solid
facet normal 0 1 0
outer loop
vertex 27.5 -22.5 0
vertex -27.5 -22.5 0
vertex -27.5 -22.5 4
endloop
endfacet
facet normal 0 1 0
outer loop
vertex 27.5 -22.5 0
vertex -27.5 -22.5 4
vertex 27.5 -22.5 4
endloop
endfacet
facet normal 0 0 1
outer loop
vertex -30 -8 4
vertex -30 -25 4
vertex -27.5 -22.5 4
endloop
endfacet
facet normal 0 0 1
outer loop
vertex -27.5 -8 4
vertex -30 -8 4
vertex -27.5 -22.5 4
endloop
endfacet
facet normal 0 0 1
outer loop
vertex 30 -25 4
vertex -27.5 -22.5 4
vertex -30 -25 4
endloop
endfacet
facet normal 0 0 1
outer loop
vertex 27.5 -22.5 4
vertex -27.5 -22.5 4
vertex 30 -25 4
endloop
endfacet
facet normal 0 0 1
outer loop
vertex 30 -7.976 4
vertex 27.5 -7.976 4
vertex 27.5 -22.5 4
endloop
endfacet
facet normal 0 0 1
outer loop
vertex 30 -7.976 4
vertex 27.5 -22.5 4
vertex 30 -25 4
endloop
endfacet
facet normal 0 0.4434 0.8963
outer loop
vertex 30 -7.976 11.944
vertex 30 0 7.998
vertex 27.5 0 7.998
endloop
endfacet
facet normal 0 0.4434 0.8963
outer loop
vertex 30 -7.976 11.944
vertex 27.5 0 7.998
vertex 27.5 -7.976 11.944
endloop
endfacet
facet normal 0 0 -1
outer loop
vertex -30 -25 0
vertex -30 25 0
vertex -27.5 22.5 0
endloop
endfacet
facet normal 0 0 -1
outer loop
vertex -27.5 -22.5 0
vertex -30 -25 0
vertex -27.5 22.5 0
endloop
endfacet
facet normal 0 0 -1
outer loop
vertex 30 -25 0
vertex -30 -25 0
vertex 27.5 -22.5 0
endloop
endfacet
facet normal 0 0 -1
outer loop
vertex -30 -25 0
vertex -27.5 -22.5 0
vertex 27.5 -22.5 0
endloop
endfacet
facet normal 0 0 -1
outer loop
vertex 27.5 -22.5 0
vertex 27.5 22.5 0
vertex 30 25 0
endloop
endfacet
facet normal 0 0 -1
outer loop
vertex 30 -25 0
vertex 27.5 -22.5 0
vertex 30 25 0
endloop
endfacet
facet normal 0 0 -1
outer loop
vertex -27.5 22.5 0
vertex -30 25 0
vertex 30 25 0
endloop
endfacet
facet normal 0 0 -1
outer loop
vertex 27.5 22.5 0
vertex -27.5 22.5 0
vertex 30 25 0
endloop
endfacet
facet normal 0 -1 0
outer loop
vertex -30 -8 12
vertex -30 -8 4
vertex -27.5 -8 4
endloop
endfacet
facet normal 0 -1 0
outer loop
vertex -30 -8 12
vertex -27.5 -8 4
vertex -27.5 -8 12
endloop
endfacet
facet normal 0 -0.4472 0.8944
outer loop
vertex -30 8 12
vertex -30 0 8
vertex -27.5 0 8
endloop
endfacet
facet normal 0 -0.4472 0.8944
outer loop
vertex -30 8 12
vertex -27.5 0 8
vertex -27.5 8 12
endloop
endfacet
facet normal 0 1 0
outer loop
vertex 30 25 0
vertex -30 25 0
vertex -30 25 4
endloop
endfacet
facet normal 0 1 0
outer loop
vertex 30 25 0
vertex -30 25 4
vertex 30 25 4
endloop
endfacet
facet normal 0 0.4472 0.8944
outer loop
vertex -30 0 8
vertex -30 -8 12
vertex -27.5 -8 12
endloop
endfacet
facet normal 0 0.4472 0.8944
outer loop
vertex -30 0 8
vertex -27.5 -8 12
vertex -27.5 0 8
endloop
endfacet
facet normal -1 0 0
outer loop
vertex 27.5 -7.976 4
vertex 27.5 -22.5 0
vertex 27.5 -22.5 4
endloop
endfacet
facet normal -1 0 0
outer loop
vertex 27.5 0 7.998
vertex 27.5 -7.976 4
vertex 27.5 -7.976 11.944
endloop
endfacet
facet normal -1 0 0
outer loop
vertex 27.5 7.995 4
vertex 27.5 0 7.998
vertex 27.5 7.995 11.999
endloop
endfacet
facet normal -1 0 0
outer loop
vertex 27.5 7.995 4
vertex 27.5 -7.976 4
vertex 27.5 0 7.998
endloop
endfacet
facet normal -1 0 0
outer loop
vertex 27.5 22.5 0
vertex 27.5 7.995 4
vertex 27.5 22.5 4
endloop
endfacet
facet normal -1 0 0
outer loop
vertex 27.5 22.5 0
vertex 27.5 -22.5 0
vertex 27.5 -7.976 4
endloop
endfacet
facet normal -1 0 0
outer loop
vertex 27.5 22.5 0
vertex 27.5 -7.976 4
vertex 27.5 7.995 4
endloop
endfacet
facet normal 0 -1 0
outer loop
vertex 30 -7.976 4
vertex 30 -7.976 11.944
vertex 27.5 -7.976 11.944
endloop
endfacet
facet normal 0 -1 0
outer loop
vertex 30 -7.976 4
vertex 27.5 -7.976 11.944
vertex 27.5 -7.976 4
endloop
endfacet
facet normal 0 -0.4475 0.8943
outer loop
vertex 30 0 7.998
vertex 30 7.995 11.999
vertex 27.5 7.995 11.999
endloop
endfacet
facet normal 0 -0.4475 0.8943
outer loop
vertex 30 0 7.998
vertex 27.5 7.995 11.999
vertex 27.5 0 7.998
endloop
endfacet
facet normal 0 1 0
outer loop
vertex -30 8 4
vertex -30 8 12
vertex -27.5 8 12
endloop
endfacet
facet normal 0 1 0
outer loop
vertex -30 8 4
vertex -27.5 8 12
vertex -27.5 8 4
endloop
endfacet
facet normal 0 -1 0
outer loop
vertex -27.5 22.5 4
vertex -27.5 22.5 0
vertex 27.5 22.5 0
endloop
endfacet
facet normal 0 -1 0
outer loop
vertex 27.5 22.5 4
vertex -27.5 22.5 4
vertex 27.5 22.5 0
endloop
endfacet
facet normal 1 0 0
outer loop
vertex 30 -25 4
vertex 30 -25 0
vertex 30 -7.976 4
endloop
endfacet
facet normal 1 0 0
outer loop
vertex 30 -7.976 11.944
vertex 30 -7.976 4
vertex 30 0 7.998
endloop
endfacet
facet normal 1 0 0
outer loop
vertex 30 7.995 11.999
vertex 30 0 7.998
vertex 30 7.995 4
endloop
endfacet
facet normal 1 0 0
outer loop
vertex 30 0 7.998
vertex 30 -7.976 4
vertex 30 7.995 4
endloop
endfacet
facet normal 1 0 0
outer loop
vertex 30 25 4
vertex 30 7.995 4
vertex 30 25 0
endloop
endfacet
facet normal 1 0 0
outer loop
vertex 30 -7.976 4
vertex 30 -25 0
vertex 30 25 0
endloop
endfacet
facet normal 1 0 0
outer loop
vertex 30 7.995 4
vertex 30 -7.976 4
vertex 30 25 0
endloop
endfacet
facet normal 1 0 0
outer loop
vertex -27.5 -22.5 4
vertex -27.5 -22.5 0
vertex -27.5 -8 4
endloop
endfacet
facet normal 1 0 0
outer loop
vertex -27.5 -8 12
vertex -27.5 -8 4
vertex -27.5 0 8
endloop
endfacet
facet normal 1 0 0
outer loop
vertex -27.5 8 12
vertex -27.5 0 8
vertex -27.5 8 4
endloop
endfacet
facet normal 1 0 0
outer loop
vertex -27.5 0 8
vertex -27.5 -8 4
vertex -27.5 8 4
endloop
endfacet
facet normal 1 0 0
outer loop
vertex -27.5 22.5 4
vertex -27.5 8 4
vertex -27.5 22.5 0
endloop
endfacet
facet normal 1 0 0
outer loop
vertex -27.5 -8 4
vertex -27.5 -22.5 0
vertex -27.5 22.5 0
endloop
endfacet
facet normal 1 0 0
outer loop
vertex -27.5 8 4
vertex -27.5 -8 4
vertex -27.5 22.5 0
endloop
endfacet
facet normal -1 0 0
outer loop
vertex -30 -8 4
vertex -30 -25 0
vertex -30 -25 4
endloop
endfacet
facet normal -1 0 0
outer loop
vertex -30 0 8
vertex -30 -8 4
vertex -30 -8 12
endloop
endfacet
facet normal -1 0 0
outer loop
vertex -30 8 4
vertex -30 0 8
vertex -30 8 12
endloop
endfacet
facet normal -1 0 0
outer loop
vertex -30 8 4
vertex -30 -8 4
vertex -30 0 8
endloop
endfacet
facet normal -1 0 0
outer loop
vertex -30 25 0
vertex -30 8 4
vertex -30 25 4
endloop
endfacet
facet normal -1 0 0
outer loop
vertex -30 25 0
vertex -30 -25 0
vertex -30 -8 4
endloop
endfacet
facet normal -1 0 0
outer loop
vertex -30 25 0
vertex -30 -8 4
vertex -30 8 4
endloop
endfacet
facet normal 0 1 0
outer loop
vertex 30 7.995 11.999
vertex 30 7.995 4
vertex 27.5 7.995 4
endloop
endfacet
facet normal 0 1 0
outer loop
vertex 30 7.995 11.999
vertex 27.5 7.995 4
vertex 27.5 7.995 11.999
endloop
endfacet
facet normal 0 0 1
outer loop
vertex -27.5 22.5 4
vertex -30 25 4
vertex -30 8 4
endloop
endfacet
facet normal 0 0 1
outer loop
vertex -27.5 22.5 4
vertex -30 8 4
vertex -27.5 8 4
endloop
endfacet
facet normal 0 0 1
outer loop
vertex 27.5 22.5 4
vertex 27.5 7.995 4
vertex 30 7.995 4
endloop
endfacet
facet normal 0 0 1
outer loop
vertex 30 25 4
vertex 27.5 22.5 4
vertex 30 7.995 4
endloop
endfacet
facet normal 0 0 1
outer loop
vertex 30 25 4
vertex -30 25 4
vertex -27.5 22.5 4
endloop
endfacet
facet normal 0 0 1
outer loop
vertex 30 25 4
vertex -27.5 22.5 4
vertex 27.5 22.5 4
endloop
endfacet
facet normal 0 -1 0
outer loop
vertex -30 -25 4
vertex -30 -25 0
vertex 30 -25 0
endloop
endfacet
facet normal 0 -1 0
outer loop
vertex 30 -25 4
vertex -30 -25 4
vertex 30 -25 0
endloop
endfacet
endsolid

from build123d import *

# Parameters (mm, degrees)
F0_W     = 60
F0_H     = 50
F0_W_2   = 55
F0_H_2   = 45
F1_DEPTH = 4
F3_DEPTH = 2.5
F5_DEPTH = 2.5


with BuildPart() as f1:
    # F0 (on Top) → F1 (new body)
    with BuildSketch(Plane.XY):
        Rectangle(F0_W, F0_H)
        Rectangle(F0_W_2, F0_H_2, mode=Mode.SUBTRACT)
    extrude(amount=F1_DEPTH)

    # F2 (on face) → F3 (join)
    with BuildSketch(Plane(origin=(-30, 0, 0), x_dir=(0, -1, 0), z_dir=(-1, 0, 0))):
        Polygon((-8, 12), (-8, 4), (8, 4), (8, 12), (0, 8), align=None)
    extrude(amount=-F3_DEPTH)

    # F4 (on face) → F5 (join)
    with BuildSketch(Plane.YZ.offset(30)):
        Polygon((-7.976269, 11.944397), (-7.976269, 4), (7.995203, 4), (7.995203, 11.999263), (0, 7.997541), align=None)
    extrude(amount=-F5_DEPTH)


solid = f1.part
